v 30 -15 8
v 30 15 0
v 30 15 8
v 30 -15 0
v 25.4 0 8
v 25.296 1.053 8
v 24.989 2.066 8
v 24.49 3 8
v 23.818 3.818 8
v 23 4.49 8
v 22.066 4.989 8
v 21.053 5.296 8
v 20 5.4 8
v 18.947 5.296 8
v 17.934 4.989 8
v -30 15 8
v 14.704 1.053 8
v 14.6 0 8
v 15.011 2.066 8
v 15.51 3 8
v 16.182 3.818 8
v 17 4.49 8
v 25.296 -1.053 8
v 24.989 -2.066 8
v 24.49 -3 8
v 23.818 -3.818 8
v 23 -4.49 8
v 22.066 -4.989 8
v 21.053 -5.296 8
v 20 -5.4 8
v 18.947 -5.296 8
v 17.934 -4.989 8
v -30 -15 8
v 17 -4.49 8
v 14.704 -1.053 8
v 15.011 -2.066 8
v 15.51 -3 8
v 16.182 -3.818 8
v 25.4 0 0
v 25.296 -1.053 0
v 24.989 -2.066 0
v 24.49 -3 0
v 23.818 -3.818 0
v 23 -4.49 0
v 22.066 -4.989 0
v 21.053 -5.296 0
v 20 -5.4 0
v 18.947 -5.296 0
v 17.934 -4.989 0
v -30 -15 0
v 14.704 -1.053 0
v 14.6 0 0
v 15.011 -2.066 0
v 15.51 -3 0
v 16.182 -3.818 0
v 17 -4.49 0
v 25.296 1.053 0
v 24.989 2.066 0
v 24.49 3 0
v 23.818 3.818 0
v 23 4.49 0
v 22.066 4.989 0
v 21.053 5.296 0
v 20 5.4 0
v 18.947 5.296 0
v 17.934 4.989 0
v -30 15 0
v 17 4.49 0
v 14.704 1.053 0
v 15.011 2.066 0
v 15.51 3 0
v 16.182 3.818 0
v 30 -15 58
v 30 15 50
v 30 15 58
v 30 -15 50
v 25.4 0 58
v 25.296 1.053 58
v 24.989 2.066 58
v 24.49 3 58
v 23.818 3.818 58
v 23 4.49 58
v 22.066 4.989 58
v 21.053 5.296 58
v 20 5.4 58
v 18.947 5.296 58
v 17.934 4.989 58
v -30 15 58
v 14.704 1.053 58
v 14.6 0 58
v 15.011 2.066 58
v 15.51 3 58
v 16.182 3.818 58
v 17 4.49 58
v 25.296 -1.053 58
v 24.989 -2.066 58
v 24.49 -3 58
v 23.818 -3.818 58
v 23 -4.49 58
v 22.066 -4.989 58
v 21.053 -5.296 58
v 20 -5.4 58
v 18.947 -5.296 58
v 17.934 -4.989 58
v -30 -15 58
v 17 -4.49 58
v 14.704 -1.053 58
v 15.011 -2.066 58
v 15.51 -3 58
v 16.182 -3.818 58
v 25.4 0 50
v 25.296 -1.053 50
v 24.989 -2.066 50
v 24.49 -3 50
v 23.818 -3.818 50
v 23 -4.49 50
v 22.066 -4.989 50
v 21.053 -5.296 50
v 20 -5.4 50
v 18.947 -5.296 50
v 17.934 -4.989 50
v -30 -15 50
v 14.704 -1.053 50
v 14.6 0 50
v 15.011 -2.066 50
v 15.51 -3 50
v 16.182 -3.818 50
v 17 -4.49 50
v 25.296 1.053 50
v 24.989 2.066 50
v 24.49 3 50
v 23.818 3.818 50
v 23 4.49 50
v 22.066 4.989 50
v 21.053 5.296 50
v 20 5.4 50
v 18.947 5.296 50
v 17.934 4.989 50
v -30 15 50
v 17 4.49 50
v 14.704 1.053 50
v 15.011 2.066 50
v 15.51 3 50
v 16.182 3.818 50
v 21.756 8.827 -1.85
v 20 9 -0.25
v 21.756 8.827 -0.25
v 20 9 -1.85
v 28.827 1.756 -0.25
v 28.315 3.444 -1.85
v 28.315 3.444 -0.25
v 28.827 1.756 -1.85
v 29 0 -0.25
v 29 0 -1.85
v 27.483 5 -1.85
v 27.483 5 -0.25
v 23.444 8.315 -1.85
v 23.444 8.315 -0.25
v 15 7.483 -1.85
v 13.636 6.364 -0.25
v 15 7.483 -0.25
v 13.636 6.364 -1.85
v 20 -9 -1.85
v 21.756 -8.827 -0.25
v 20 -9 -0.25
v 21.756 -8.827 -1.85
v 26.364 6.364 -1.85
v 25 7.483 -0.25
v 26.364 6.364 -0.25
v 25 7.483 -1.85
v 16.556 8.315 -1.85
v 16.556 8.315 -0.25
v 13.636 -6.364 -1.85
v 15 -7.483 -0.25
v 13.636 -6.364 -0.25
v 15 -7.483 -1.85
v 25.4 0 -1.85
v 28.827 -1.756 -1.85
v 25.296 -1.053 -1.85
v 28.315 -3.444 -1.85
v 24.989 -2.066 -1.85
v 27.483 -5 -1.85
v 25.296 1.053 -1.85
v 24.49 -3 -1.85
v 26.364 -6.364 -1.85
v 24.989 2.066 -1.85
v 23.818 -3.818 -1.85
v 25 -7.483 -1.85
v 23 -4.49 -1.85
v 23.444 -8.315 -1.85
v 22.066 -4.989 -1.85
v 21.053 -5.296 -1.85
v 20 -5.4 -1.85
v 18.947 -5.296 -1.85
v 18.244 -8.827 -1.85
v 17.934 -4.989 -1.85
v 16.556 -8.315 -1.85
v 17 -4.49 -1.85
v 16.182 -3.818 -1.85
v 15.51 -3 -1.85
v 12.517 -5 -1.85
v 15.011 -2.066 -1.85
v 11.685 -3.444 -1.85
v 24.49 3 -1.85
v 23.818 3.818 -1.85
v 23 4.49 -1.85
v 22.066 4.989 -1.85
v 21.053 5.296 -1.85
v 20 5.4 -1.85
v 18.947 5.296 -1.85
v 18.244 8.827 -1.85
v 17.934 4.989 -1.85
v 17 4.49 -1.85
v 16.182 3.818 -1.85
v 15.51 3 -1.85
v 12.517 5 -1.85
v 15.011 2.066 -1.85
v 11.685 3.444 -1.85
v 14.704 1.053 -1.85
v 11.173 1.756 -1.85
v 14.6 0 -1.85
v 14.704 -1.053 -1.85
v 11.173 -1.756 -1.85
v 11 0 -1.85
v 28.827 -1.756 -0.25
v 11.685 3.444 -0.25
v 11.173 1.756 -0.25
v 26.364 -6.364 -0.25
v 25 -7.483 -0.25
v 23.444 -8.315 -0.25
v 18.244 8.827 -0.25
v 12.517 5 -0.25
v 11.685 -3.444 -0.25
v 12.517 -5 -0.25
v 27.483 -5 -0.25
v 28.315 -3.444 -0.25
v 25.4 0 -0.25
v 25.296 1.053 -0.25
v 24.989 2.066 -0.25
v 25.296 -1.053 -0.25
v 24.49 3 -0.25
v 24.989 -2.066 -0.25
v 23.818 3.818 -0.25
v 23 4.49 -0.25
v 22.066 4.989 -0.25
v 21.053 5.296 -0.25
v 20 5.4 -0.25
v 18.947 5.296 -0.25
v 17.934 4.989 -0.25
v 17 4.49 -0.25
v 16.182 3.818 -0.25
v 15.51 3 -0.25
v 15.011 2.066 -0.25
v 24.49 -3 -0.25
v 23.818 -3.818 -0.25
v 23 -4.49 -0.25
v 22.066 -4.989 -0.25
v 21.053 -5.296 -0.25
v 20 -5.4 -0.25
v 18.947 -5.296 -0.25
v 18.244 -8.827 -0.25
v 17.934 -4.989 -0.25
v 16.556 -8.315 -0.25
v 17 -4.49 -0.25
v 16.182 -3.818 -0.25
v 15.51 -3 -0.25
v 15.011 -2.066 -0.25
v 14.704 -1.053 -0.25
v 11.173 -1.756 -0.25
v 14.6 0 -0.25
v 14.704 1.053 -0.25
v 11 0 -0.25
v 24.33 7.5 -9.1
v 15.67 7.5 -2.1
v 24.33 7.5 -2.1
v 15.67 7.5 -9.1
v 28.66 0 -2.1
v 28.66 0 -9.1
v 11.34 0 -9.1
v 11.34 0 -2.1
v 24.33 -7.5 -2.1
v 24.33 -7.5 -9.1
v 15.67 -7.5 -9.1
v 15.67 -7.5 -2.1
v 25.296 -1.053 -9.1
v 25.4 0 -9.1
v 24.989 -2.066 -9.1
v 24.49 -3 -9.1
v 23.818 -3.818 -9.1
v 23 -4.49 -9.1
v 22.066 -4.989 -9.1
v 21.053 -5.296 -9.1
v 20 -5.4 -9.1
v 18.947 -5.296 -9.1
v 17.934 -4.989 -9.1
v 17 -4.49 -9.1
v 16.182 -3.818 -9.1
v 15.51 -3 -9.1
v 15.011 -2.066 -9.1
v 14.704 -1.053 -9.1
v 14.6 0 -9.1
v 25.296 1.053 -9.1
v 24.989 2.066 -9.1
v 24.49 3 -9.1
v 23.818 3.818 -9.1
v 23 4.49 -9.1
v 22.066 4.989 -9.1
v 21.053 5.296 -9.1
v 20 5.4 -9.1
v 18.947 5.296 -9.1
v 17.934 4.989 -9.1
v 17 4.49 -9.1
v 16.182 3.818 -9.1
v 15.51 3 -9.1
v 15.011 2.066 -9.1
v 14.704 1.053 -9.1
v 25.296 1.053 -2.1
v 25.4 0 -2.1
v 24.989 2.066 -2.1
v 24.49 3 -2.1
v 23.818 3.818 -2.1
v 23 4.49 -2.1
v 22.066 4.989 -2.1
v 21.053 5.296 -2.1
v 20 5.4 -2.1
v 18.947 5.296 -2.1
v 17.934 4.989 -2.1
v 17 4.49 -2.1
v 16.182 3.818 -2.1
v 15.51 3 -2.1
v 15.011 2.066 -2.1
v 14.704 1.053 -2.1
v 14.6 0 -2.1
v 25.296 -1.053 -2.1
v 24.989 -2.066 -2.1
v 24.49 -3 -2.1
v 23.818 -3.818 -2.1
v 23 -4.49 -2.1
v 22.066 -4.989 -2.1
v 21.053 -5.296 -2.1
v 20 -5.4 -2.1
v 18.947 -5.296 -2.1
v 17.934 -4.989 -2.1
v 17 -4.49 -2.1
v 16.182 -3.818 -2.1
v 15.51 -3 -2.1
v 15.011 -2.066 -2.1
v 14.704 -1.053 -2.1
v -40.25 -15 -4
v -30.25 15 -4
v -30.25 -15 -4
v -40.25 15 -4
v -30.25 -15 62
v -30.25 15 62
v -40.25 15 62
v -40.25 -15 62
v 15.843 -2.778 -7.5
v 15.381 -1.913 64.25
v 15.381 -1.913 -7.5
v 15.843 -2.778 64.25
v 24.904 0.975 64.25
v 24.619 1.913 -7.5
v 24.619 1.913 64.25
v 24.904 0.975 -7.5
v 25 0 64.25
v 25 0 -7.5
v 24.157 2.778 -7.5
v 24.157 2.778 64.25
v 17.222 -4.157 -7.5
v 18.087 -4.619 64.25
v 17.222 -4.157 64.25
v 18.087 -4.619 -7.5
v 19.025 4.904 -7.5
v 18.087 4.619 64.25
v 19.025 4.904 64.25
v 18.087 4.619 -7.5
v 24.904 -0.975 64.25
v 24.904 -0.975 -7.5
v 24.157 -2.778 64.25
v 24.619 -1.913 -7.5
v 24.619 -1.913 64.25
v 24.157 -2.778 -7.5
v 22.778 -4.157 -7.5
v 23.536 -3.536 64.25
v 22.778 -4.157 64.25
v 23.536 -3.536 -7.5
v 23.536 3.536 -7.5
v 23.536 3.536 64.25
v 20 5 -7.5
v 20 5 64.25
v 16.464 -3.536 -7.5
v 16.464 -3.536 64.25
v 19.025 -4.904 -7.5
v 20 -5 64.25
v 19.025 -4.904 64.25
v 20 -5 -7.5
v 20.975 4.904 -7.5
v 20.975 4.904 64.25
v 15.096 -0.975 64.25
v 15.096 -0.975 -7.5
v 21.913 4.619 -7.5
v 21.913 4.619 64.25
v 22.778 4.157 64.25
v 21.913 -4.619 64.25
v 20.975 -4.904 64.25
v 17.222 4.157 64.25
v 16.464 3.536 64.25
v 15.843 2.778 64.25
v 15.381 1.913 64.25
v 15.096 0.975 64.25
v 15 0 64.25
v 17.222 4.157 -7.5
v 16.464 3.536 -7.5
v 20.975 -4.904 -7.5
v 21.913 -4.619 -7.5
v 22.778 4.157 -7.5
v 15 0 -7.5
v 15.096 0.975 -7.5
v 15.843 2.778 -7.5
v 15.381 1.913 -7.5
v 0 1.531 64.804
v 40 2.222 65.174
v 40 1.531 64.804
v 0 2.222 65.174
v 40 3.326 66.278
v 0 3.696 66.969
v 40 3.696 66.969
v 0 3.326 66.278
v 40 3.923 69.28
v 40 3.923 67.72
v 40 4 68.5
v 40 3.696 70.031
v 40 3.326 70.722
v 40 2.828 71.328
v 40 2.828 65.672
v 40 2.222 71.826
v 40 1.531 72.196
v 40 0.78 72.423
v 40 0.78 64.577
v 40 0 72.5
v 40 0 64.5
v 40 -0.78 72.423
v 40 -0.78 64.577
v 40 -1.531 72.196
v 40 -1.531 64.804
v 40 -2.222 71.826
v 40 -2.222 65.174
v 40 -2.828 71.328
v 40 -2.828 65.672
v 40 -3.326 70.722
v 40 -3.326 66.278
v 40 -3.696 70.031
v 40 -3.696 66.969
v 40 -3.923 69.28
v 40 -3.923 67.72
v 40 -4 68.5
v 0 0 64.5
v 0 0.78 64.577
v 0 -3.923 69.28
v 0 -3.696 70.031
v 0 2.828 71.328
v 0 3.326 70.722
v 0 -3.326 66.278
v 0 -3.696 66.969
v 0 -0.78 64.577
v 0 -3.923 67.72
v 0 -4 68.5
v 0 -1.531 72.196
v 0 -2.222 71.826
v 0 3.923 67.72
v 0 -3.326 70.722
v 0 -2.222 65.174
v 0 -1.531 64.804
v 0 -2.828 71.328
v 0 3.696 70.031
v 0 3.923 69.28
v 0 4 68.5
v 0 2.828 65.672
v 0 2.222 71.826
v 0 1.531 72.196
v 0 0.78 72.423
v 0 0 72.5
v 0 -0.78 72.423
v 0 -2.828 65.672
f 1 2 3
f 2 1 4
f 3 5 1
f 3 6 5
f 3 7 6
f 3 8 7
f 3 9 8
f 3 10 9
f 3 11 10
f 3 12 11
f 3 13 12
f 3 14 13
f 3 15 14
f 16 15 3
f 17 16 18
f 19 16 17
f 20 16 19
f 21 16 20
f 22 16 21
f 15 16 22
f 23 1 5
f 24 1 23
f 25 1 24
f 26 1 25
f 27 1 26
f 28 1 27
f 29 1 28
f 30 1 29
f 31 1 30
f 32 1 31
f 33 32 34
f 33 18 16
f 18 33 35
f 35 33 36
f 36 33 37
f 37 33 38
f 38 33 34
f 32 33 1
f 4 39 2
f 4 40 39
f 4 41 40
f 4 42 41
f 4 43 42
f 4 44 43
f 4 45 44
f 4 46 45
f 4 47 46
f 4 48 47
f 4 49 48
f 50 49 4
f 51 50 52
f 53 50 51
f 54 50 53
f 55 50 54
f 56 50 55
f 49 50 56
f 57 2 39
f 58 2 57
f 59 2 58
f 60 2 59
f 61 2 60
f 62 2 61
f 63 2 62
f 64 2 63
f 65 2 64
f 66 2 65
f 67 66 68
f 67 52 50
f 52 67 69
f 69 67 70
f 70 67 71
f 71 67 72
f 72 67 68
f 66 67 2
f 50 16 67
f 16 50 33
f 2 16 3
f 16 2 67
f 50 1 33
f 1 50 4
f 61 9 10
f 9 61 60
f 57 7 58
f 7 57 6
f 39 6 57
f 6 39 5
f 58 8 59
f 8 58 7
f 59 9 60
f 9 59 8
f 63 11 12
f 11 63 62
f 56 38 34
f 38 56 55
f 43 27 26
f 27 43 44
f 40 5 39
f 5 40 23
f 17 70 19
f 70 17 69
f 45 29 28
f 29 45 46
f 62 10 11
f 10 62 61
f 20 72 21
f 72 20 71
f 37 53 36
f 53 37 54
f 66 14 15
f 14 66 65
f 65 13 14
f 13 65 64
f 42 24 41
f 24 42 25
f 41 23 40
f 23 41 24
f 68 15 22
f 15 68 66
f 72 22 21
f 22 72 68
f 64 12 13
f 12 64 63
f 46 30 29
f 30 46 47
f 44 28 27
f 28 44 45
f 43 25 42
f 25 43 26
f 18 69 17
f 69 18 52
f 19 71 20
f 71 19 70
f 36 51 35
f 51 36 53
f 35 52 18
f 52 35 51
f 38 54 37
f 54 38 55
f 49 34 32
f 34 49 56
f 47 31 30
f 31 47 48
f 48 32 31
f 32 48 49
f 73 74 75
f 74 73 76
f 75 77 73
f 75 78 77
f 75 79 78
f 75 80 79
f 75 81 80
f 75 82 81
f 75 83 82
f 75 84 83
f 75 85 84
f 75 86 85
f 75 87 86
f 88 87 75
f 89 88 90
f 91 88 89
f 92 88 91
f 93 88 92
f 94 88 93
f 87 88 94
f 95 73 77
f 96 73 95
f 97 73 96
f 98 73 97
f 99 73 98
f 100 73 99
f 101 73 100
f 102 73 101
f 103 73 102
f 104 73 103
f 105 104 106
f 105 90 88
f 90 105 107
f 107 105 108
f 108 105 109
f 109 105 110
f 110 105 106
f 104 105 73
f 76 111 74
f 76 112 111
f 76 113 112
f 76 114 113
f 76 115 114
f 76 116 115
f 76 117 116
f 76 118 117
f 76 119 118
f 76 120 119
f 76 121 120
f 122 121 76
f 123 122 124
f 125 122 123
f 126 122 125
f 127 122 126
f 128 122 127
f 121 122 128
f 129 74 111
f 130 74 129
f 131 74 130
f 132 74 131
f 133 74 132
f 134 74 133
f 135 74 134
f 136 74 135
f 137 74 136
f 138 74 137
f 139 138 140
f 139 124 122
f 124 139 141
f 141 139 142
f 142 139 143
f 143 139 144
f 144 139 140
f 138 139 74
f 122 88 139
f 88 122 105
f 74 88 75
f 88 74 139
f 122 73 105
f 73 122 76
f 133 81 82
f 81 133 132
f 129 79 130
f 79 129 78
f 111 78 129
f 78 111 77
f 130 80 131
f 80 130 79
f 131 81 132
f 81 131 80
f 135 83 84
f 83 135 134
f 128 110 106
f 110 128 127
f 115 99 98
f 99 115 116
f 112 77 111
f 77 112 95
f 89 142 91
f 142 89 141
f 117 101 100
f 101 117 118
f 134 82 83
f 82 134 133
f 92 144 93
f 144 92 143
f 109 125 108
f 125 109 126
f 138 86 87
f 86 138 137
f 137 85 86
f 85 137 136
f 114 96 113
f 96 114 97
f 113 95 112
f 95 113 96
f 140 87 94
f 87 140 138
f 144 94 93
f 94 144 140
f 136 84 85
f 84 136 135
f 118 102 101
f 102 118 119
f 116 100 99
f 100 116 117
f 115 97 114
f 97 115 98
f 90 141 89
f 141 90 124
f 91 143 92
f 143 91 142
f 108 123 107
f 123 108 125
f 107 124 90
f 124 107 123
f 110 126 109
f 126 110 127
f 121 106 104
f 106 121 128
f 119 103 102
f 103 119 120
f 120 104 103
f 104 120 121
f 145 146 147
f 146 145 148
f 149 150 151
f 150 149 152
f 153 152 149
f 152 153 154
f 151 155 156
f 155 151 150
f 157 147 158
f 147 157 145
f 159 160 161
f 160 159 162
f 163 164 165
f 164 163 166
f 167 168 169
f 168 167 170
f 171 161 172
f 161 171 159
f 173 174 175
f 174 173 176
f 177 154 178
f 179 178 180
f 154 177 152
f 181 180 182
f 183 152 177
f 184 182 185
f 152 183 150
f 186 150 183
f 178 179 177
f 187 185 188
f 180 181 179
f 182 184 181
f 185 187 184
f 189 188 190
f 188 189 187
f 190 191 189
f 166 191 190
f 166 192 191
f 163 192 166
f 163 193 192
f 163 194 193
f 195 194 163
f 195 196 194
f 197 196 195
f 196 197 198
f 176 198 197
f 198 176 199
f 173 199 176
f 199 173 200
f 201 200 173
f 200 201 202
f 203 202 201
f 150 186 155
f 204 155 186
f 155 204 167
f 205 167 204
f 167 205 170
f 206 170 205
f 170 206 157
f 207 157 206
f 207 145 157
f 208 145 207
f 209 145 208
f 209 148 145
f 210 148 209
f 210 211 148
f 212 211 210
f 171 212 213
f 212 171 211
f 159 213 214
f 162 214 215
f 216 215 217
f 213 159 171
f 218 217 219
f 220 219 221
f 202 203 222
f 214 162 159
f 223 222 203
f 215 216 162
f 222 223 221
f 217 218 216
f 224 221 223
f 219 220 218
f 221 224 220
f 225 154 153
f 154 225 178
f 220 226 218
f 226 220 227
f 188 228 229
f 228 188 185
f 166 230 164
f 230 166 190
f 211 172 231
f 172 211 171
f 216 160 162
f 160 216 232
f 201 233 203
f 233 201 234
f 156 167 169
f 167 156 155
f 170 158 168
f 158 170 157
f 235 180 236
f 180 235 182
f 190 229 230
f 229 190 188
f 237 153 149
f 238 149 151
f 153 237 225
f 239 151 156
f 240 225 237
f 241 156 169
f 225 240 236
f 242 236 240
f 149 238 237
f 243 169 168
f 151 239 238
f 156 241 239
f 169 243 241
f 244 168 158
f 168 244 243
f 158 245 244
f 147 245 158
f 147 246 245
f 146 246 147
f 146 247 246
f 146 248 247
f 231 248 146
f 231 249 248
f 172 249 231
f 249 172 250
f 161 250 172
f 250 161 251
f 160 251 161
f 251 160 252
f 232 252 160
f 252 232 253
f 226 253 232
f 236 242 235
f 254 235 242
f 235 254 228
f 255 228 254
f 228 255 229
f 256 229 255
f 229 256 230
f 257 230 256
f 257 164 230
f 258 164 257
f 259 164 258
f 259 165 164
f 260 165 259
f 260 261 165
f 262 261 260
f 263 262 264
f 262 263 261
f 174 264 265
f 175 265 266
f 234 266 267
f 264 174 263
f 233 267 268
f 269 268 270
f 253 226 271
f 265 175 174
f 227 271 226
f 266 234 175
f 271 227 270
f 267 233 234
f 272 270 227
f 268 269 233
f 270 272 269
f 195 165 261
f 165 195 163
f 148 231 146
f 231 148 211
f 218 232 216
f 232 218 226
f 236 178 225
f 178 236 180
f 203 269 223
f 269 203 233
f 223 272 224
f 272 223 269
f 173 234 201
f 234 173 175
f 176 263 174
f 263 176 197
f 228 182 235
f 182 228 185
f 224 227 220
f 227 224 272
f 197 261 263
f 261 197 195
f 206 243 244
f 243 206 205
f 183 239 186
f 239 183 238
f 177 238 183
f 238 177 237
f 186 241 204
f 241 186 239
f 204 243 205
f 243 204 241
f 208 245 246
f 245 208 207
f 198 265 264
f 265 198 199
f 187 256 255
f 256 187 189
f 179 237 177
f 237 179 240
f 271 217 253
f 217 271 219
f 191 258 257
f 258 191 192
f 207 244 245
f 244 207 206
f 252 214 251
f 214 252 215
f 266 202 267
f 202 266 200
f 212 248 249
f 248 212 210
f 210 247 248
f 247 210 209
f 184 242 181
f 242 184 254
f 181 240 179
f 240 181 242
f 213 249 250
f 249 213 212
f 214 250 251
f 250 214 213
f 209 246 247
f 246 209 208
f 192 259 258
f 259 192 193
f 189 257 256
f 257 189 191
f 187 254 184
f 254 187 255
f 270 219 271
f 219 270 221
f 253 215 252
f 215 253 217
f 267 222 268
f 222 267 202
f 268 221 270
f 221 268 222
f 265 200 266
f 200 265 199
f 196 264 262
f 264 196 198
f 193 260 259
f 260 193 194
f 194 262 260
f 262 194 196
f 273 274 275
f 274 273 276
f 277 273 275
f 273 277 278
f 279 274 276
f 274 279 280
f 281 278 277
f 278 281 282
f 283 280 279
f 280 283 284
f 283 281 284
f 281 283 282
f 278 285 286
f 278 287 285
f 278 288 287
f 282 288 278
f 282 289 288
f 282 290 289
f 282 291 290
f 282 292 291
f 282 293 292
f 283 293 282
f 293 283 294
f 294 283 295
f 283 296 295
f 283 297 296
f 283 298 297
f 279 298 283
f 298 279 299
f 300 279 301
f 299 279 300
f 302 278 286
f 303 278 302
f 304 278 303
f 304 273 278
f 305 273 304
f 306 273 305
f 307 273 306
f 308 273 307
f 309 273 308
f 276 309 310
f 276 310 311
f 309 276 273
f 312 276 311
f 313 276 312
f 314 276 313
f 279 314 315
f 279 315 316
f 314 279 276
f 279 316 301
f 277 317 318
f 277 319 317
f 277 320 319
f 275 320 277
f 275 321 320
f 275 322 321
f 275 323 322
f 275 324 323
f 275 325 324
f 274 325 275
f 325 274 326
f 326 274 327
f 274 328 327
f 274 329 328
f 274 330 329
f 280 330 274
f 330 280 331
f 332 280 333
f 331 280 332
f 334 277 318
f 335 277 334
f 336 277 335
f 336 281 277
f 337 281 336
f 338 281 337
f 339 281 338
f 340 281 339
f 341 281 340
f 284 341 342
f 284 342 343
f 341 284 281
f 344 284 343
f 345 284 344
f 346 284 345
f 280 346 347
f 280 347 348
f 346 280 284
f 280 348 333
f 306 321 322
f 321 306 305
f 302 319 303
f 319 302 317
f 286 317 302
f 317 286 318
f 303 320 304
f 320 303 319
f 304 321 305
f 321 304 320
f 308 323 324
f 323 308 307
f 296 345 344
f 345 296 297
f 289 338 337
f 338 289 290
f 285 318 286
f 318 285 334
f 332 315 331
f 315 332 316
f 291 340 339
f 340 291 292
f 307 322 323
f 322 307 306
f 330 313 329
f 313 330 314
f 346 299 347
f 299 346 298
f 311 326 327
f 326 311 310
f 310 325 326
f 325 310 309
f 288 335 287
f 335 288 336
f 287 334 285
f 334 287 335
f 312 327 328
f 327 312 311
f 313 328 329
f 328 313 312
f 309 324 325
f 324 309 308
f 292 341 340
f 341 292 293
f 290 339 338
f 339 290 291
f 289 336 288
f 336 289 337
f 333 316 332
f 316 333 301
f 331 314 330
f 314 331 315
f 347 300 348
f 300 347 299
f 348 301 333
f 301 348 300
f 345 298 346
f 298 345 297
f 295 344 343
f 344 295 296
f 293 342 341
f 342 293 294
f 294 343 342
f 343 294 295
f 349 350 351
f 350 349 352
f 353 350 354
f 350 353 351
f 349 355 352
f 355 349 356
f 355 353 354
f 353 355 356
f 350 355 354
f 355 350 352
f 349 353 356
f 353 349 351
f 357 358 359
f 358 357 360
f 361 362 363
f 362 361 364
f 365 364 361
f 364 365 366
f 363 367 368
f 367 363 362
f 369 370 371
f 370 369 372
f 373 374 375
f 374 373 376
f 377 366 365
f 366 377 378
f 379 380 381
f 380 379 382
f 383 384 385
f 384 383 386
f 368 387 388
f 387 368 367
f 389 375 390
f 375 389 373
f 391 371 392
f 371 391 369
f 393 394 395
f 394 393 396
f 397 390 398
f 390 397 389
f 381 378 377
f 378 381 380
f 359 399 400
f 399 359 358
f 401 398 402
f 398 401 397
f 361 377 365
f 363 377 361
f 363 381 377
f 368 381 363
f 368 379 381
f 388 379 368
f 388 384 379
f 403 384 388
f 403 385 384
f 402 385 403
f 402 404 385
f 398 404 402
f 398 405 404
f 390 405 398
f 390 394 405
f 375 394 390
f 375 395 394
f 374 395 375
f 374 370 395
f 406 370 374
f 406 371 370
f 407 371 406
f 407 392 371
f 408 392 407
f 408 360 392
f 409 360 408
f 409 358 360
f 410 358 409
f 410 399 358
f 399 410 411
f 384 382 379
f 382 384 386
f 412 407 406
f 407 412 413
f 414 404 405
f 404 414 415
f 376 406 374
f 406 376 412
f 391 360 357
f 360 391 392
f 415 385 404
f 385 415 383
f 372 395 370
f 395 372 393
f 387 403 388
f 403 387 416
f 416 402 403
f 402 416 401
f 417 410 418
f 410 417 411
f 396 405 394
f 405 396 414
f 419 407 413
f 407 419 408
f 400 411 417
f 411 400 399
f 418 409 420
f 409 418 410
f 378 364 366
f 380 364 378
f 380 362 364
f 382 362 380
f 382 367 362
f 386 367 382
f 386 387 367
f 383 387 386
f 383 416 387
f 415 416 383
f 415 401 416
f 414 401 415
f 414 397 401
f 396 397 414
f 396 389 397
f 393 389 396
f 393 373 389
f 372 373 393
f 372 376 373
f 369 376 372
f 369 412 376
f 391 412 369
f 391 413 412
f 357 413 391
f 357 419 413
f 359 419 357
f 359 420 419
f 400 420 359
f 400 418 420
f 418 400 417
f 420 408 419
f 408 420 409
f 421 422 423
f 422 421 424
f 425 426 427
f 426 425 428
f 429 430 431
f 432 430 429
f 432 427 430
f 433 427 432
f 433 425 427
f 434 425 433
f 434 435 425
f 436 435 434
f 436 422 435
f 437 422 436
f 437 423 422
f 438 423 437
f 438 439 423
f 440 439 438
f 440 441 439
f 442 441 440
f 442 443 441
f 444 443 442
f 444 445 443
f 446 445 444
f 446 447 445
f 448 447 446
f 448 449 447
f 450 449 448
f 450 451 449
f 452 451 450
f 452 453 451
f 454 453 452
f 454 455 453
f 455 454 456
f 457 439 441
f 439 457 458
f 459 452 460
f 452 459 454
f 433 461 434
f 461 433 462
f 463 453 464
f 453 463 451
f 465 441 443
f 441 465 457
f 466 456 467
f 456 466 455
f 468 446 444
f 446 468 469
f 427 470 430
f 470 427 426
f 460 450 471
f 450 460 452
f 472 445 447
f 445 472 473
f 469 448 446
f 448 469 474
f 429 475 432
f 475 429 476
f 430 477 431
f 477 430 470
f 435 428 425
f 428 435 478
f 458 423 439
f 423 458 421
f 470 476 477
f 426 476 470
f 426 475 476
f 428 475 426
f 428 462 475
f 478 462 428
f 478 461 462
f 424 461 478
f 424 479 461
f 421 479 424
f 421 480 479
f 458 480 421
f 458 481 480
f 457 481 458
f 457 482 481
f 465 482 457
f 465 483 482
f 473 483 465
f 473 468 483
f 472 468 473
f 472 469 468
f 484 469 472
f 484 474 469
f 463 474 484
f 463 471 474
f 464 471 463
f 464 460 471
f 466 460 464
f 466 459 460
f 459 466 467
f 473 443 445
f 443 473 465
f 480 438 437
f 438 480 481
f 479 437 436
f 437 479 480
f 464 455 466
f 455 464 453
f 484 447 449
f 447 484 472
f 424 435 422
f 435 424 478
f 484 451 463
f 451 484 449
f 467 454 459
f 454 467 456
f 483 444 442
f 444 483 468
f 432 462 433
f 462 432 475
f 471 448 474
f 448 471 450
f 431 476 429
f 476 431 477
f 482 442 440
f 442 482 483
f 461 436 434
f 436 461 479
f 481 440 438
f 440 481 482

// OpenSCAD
$fn = 32;

// ------------------------------------------------------------------------
// C clamp: throat 50 mm, screw d10
// Every part is its own module, assembly() places every instance.
// ------------------------------------------------------------------------

// --- part 1 ---
module clamp_arm() {
  difference() {
    translate([-30, -15, 0]) cube([60, 30, 8]);
    translate([20, 0, -1]) cylinder(h = 10, d = 10.8);
  }
}

// --- part 2 ---
module clamp_spine() {
  difference() {
    translate([-33, -15, 0]) cube([66, 30, 10]);
  }
}

// --- part 3 ---
module clamp_screw() {
  translate([0, 0, -35.875]) cylinder(h = 71.75, d = 10);
}

// --- part 4 ---
module clamp_washer() {
  difference() {
      translate([0, 0, 0]) cylinder(h = 1.6, d = 18);
      translate([0, 0, -1]) cylinder(h = 3.6, d = 10.8);
    }
}

// --- part 5 ---
module clamp_nut() {
  difference() {
    linear_extrude(height = 7) polygon(points = [[8.66, 0], [4.33, 7.5], [-4.33, 7.5], [-8.66, 0], [-4.33, -7.5], [4.33, -7.5]]);
    translate([0, 0, -1]) cylinder(h = 9, d = 10.8);
  }
}

// --- part 6 ---
module tommy_bar() {
  translate([0, 0, -20]) cylinder(h = 40, d = 8);
}

// --- assembly ---
module assembly() {
  color([0.80, 0.24, 0.20]) translate([0, 0, 0]) rotate([0, 0, 0]) clamp_arm();
  color([0.20, 0.45, 0.75]) translate([0, 0, 50]) rotate([0, 0, 0]) clamp_arm();
  color([0.25, 0.62, 0.32]) translate([-40.25, 0, 29]) rotate([0, 90, 0]) clamp_spine();
  color([0.92, 0.70, 0.18]) translate([20, 0, 28.375]) rotate([0, 0, 0]) clamp_screw();
  color([0.58, 0.35, 0.70]) translate([20, 0, -1.85]) rotate([0, 0, 0]) clamp_washer();
  color([0.16, 0.66, 0.66]) translate([20, 0, -9.1]) rotate([0, 0, 0]) clamp_nut();
  color([0.85, 0.48, 0.18]) translate([20, 0, 68.5]) rotate([0, 90, 0]) tommy_bar();
}

assembly();
